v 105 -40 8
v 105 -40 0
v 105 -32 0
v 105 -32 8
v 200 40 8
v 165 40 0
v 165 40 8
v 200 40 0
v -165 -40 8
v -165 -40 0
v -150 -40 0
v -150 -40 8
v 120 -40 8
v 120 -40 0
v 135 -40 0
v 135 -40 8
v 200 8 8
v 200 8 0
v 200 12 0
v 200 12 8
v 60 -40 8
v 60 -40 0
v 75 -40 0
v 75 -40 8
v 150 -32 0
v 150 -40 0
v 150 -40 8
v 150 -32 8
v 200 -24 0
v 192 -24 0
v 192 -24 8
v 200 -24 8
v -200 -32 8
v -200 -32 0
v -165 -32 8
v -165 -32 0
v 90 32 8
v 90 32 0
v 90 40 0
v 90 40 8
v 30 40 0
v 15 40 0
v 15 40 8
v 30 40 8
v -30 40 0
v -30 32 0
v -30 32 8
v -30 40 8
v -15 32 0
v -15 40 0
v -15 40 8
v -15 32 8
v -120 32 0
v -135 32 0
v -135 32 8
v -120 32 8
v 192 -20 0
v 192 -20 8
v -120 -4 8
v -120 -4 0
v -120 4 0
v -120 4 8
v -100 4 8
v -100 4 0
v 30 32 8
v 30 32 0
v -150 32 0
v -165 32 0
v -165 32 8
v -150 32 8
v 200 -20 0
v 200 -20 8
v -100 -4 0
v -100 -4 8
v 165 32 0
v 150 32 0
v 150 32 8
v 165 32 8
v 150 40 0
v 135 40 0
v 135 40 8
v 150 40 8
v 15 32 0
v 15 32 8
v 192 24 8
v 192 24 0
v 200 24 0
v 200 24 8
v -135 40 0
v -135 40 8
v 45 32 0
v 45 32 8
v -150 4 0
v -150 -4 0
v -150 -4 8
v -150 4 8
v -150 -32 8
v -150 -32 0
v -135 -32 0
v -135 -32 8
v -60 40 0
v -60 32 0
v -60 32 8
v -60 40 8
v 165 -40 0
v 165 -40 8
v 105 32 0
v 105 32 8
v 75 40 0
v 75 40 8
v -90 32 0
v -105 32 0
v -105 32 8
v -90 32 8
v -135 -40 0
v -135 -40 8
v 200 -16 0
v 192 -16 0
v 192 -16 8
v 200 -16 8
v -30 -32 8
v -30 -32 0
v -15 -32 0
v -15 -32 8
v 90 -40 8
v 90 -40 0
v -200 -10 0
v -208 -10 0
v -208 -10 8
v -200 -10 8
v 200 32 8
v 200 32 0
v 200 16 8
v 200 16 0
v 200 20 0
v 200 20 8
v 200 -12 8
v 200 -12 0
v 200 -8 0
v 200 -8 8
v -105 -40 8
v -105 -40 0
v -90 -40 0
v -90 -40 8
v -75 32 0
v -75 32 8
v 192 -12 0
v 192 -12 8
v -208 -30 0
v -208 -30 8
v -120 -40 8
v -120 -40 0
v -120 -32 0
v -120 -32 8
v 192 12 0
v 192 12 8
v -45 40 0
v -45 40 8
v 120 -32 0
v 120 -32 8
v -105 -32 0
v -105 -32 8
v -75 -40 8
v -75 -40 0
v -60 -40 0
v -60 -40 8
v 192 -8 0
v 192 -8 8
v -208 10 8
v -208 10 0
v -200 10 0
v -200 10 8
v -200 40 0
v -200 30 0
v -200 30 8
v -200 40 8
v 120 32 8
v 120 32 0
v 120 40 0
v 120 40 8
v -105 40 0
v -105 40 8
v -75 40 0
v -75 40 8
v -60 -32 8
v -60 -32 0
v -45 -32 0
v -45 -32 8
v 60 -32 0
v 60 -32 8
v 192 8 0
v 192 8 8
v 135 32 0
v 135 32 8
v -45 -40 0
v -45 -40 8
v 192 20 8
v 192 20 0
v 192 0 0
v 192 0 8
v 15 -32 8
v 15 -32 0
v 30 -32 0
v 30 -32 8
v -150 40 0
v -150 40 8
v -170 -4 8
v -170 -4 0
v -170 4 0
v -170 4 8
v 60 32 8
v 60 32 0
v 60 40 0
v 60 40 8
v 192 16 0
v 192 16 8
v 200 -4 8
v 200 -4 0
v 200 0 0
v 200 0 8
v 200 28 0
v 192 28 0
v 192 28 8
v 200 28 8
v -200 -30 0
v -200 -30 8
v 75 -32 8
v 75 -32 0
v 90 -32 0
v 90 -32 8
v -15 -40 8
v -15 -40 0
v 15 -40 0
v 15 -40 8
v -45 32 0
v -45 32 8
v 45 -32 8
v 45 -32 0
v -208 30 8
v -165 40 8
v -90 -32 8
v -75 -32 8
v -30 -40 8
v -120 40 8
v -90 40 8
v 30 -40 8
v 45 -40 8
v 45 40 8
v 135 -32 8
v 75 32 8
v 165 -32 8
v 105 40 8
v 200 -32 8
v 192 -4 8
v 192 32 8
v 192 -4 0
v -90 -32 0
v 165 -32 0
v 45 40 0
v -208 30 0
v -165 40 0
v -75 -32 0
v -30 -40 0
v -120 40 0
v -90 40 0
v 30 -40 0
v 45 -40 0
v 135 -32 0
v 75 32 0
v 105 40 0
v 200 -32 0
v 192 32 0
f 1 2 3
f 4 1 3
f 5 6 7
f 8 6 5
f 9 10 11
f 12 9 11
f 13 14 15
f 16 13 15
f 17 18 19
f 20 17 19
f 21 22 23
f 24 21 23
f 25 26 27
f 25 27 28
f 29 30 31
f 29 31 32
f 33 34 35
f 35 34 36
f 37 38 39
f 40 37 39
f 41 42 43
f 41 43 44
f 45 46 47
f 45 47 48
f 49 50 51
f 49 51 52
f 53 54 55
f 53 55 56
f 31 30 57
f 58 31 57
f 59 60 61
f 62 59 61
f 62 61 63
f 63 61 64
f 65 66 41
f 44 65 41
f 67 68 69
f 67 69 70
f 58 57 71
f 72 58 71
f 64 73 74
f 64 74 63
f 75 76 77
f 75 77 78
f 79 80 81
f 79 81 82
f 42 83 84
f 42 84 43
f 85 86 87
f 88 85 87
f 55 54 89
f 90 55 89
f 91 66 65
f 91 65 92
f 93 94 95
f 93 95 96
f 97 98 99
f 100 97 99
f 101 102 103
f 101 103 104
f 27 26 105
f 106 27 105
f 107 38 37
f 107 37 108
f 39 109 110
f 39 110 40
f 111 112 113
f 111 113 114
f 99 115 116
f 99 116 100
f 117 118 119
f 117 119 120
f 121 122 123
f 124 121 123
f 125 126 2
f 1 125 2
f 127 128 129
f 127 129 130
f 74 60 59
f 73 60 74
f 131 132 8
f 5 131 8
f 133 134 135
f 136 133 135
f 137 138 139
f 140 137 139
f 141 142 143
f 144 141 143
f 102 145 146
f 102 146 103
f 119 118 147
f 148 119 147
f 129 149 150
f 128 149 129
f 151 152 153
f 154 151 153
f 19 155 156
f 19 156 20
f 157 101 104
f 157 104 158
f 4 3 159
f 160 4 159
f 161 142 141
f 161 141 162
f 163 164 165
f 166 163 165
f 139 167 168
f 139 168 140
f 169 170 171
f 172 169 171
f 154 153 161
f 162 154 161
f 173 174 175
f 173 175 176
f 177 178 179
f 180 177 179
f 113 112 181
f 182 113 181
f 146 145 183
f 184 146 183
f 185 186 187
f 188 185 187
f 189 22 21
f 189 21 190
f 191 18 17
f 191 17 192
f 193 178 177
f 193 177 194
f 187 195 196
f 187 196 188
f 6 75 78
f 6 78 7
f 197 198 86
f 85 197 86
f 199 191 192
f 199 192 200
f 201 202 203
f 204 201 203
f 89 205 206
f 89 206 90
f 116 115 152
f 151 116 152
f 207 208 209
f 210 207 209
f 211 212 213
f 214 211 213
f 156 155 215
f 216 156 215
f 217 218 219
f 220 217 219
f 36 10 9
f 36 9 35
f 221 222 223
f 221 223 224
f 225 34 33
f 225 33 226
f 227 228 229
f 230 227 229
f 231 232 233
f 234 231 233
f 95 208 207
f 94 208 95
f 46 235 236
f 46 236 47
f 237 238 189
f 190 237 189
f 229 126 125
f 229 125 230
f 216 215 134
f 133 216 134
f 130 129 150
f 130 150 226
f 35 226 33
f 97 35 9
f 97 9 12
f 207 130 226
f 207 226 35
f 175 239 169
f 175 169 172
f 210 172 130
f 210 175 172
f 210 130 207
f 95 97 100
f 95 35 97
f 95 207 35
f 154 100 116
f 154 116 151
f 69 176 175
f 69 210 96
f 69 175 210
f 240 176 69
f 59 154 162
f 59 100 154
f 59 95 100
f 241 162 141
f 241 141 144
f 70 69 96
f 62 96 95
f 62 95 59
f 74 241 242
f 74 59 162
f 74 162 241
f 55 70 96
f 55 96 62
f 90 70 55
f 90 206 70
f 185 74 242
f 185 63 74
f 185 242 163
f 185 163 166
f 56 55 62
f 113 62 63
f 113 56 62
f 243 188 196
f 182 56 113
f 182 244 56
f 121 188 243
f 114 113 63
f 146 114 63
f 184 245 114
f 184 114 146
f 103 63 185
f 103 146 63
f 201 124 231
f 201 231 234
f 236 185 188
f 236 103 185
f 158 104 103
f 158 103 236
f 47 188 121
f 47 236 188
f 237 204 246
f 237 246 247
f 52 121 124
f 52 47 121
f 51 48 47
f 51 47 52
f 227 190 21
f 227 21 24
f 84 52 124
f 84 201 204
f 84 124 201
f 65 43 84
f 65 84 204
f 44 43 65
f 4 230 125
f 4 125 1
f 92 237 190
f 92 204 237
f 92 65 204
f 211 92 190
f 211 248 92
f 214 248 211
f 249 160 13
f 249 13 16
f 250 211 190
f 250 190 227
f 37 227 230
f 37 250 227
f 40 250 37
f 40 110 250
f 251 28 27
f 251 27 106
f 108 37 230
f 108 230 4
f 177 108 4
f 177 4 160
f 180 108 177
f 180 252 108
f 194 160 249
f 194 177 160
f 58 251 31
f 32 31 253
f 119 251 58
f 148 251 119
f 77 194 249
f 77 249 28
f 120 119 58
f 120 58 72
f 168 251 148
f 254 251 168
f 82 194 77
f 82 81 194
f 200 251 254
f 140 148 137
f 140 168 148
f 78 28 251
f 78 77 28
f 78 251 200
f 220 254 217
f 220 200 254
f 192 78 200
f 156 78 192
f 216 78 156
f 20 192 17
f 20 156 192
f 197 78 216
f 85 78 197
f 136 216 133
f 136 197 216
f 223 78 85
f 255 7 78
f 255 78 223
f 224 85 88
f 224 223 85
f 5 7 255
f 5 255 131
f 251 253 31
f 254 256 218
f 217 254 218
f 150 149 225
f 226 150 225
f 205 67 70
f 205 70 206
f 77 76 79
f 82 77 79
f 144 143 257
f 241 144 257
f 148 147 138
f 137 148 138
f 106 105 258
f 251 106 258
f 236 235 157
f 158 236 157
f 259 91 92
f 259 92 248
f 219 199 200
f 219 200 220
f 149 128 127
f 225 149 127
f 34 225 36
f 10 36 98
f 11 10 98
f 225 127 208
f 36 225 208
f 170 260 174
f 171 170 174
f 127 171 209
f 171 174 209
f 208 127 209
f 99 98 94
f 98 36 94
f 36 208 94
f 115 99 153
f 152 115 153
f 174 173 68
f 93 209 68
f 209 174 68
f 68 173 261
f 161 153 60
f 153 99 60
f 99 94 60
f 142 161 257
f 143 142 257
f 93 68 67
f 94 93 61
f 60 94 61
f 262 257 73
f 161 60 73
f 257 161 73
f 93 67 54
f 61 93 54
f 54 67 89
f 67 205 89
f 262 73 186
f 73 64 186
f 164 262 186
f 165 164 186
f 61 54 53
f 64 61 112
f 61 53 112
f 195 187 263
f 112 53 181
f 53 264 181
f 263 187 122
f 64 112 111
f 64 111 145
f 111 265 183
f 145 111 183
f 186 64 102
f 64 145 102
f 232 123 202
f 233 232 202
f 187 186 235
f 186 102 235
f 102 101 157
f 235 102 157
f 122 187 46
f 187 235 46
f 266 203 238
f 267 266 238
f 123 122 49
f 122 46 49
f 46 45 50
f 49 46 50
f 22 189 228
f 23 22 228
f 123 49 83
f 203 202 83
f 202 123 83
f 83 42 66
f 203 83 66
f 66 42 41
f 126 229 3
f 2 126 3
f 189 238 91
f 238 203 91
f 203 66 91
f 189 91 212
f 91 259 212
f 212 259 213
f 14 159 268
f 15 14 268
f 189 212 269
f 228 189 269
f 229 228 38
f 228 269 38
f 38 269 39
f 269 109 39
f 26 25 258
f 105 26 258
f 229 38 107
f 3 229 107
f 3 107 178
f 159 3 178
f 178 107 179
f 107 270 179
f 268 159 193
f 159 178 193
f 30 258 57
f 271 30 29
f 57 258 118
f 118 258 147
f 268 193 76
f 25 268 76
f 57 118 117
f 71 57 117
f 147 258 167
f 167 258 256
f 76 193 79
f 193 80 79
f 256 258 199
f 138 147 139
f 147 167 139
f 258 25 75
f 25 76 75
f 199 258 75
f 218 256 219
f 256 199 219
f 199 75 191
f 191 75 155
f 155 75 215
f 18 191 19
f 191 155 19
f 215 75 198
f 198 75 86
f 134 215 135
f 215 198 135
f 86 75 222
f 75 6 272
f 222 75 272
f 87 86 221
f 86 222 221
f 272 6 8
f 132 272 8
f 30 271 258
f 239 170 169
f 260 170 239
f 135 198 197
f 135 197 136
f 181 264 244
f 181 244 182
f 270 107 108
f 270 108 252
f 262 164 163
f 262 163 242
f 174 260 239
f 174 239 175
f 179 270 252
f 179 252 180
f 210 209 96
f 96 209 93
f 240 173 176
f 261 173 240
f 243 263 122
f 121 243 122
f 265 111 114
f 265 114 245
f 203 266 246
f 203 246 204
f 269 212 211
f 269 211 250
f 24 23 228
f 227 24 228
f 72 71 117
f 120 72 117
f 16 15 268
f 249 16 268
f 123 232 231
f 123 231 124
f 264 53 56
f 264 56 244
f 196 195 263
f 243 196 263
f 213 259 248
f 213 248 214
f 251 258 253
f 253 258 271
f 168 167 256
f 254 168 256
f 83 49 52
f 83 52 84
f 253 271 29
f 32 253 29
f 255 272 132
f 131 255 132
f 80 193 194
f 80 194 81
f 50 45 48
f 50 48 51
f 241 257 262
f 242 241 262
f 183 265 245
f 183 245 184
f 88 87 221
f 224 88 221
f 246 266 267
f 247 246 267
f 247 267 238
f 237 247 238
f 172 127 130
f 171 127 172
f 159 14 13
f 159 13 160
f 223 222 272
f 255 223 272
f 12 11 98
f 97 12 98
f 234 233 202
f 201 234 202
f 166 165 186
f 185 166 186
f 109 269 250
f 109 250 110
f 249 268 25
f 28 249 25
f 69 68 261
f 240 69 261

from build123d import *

# Parameters (mm, degrees)
ESQUISSE1_W             = 400
ESQUISSE1_H             = 80
BOSS_EXTRU_1_DEPTH      = 8
ESQUISSE2_W             = 8
ESQUISSE2_H             = 20
BOSS_EXTRU_2_DEPTH      = 8
ESQUISSE4_W             = 15
ESQUISSE4_H             = 8
ENL_V_MAT_EXTRU_1_DEPTH = 212.962260792
ESQUISSE5_W             = 15
ESQUISSE5_H             = 8
ESQUISSE5_W_2           = 35
ENL_V_MAT_EXTRU_2_DEPTH = 212.962260792
ESQUISSE6_W             = 20
ESQUISSE6_H             = 8
ENL_V_MAT_EXTRU_3_DEPTH = 212.962260792
ESQUISSE8_W             = 8
ESQUISSE8_H             = 4
ENL_V_MAT_EXTRU_5_DEPTH = 212.962260792


with BuildPart() as part:
    # Esquisse1 → Boss.-Extru.1 (new body)
    with BuildSketch(Plane.XY):
        Rectangle(ESQUISSE1_W, ESQUISSE1_H)
    extrude(amount=BOSS_EXTRU_1_DEPTH)

    # Esquisse2 → Boss.-Extru.2 (add)
    with BuildSketch(Plane.XY):
        with Locations((-204, 20)):
            Rectangle(ESQUISSE2_W, ESQUISSE2_H)
        with Locations((-204, -20)):
            Rectangle(ESQUISSE2_W, ESQUISSE2_H)
    extrude(amount=BOSS_EXTRU_2_DEPTH)

    # Esquisse4 → Enlèv. mat.-Extru.1 (cut, through all)
    with BuildSketch(Plane.XY):
        Polygon((0, 40), (-15, 40), (-15, 32), (0, 32), (15, 32), (15, 40), align=None)
        with Locations((-37.5, 36)):
            Rectangle(ESQUISSE4_W, ESQUISSE4_H)
        with Locations((-67.5, 36)):
            Rectangle(ESQUISSE4_W, ESQUISSE4_H)
        with Locations((-97.5, 36)):
            Rectangle(ESQUISSE4_W, ESQUISSE4_H)
        with Locations((-127.5, 36)):
            Rectangle(ESQUISSE4_W, ESQUISSE4_H)
        with Locations((-157.5, 36)):
            Rectangle(ESQUISSE4_W, ESQUISSE4_H)
        with Locations((37.5, 36)):
            Rectangle(ESQUISSE4_W, ESQUISSE4_H)
        with Locations((67.5, 36)):
            Rectangle(ESQUISSE4_W, ESQUISSE4_H)
        with Locations((97.5, 36)):
            Rectangle(ESQUISSE4_W, ESQUISSE4_H)
        with Locations((127.5, 36)):
            Rectangle(ESQUISSE4_W, ESQUISSE4_H)
        with Locations((157.5, 36)):
            Rectangle(ESQUISSE4_W, ESQUISSE4_H)
    extrude(amount=ENL_V_MAT_EXTRU_1_DEPTH, mode=Mode.SUBTRACT)

    # Esquisse5 → Enlèv. mat.-Extru.2 (cut, through all)
    with BuildSketch(Plane.XY):
        with Locations((-22.5, -36)):
            Rectangle(ESQUISSE5_W, ESQUISSE5_H)
        with Locations((-52.5, -36)):
            Rectangle(ESQUISSE5_W, ESQUISSE5_H)
        with Locations((-82.5, -36)):
            Rectangle(ESQUISSE5_W, ESQUISSE5_H)
        with Locations((-112.5, -36)):
            Rectangle(ESQUISSE5_W, ESQUISSE5_H)
        with Locations((-142.5, -36)):
            Rectangle(ESQUISSE5_W, ESQUISSE5_H)
        with Locations((-182.5, -36)):
            Rectangle(ESQUISSE5_W_2, ESQUISSE5_H)
        with Locations((22.5, -36)):
            Rectangle(ESQUISSE5_W, ESQUISSE5_H)
        with Locations((52.5, -36)):
            Rectangle(ESQUISSE5_W, ESQUISSE5_H)
        with Locations((82.5, -36)):
            Rectangle(ESQUISSE5_W, ESQUISSE5_H)
        with Locations((112.5, -36)):
            Rectangle(ESQUISSE5_W, ESQUISSE5_H)
        with Locations((142.5, -36)):
            Rectangle(ESQUISSE5_W, ESQUISSE5_H)
        with Locations((182.5, -36)):
            Rectangle(ESQUISSE5_W_2, ESQUISSE5_H)
    extrude(amount=ENL_V_MAT_EXTRU_2_DEPTH, mode=Mode.SUBTRACT)

    # Esquisse6 → Enlèv. mat.-Extru.3 (cut, through all)
    with BuildSketch(Plane.XY):
        with Locations((-160, 0)):
            Rectangle(ESQUISSE6_W, ESQUISSE6_H)
        with Locations((-110, 0)):
            Rectangle(ESQUISSE6_W, ESQUISSE6_H)
    extrude(amount=ENL_V_MAT_EXTRU_3_DEPTH, mode=Mode.SUBTRACT)

    # Esquisse8 → Enlèv. mat.-Extru.5 (cut, through all)
    with BuildSketch(Plane.XY):
        Polygon((200, 4), (200, 8), (192, 8), (192, 4), (192, 0), (200, 0), align=None)
        with Locations((196, 14)):
            Rectangle(ESQUISSE8_W, ESQUISSE8_H)
        with Locations((196, 22)):
            Rectangle(ESQUISSE8_W, ESQUISSE8_H)
        with Locations((196, 30)):
            Rectangle(ESQUISSE8_W, ESQUISSE8_H)
        with Locations((196, -6)):
            Rectangle(ESQUISSE8_W, ESQUISSE8_H)
        with Locations((196, -14)):
            Rectangle(ESQUISSE8_W, ESQUISSE8_H)
        with Locations((196, -22)):
            Rectangle(ESQUISSE8_W, ESQUISSE8_H)
    extrude(amount=ENL_V_MAT_EXTRU_5_DEPTH, mode=Mode.SUBTRACT)


solid = part.part
